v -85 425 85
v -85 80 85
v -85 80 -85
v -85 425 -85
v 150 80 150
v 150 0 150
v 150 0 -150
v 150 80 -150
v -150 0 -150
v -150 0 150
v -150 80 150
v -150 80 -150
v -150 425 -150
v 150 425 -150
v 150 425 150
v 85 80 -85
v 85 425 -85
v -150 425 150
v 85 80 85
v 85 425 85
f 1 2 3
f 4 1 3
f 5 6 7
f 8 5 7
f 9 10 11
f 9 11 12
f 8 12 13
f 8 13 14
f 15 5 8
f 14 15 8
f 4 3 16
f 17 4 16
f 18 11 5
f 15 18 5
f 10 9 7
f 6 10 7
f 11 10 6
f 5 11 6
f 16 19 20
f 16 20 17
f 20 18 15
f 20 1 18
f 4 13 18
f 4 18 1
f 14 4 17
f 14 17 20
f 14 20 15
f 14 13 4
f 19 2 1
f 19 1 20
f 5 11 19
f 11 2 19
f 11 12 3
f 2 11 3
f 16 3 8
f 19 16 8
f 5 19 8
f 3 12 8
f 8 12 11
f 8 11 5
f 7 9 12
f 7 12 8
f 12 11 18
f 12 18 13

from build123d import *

# Parameters (mm, degrees)
SKETCH1_W           = 300
SKETCH1_H           = 300
BOSS_EXTRUDE1_DEPTH = 80
SKETCH2_W           = 300
SKETCH2_H           = 300
SKETCH2_W_2         = 170
SKETCH2_H_2         = 170
BOSS_EXTRUDE2_DEPTH = 345


with BuildPart() as part:
    # Sketch1 → Boss-Extrude1 (new body)
    with BuildSketch(Plane(origin=(0, 0, 0), x_dir=(1, 0, 0), z_dir=(0, 1, 0))):
        Rectangle(SKETCH1_W, SKETCH1_H)
    extrude(amount=BOSS_EXTRUDE1_DEPTH)


with BuildPart() as body_2:
    # Sketch2 → Boss-Extrude2 (new body)
    with BuildSketch(Plane(origin=(0, 80, 0), x_dir=(1, 0, 0), z_dir=(0, 1, 0))):
        Rectangle(SKETCH2_W, SKETCH2_H)
        Rectangle(SKETCH2_W_2, SKETCH2_H_2, mode=Mode.SUBTRACT)
    extrude(amount=BOSS_EXTRUDE2_DEPTH)


solid = Compound([part.part, body_2.part])
